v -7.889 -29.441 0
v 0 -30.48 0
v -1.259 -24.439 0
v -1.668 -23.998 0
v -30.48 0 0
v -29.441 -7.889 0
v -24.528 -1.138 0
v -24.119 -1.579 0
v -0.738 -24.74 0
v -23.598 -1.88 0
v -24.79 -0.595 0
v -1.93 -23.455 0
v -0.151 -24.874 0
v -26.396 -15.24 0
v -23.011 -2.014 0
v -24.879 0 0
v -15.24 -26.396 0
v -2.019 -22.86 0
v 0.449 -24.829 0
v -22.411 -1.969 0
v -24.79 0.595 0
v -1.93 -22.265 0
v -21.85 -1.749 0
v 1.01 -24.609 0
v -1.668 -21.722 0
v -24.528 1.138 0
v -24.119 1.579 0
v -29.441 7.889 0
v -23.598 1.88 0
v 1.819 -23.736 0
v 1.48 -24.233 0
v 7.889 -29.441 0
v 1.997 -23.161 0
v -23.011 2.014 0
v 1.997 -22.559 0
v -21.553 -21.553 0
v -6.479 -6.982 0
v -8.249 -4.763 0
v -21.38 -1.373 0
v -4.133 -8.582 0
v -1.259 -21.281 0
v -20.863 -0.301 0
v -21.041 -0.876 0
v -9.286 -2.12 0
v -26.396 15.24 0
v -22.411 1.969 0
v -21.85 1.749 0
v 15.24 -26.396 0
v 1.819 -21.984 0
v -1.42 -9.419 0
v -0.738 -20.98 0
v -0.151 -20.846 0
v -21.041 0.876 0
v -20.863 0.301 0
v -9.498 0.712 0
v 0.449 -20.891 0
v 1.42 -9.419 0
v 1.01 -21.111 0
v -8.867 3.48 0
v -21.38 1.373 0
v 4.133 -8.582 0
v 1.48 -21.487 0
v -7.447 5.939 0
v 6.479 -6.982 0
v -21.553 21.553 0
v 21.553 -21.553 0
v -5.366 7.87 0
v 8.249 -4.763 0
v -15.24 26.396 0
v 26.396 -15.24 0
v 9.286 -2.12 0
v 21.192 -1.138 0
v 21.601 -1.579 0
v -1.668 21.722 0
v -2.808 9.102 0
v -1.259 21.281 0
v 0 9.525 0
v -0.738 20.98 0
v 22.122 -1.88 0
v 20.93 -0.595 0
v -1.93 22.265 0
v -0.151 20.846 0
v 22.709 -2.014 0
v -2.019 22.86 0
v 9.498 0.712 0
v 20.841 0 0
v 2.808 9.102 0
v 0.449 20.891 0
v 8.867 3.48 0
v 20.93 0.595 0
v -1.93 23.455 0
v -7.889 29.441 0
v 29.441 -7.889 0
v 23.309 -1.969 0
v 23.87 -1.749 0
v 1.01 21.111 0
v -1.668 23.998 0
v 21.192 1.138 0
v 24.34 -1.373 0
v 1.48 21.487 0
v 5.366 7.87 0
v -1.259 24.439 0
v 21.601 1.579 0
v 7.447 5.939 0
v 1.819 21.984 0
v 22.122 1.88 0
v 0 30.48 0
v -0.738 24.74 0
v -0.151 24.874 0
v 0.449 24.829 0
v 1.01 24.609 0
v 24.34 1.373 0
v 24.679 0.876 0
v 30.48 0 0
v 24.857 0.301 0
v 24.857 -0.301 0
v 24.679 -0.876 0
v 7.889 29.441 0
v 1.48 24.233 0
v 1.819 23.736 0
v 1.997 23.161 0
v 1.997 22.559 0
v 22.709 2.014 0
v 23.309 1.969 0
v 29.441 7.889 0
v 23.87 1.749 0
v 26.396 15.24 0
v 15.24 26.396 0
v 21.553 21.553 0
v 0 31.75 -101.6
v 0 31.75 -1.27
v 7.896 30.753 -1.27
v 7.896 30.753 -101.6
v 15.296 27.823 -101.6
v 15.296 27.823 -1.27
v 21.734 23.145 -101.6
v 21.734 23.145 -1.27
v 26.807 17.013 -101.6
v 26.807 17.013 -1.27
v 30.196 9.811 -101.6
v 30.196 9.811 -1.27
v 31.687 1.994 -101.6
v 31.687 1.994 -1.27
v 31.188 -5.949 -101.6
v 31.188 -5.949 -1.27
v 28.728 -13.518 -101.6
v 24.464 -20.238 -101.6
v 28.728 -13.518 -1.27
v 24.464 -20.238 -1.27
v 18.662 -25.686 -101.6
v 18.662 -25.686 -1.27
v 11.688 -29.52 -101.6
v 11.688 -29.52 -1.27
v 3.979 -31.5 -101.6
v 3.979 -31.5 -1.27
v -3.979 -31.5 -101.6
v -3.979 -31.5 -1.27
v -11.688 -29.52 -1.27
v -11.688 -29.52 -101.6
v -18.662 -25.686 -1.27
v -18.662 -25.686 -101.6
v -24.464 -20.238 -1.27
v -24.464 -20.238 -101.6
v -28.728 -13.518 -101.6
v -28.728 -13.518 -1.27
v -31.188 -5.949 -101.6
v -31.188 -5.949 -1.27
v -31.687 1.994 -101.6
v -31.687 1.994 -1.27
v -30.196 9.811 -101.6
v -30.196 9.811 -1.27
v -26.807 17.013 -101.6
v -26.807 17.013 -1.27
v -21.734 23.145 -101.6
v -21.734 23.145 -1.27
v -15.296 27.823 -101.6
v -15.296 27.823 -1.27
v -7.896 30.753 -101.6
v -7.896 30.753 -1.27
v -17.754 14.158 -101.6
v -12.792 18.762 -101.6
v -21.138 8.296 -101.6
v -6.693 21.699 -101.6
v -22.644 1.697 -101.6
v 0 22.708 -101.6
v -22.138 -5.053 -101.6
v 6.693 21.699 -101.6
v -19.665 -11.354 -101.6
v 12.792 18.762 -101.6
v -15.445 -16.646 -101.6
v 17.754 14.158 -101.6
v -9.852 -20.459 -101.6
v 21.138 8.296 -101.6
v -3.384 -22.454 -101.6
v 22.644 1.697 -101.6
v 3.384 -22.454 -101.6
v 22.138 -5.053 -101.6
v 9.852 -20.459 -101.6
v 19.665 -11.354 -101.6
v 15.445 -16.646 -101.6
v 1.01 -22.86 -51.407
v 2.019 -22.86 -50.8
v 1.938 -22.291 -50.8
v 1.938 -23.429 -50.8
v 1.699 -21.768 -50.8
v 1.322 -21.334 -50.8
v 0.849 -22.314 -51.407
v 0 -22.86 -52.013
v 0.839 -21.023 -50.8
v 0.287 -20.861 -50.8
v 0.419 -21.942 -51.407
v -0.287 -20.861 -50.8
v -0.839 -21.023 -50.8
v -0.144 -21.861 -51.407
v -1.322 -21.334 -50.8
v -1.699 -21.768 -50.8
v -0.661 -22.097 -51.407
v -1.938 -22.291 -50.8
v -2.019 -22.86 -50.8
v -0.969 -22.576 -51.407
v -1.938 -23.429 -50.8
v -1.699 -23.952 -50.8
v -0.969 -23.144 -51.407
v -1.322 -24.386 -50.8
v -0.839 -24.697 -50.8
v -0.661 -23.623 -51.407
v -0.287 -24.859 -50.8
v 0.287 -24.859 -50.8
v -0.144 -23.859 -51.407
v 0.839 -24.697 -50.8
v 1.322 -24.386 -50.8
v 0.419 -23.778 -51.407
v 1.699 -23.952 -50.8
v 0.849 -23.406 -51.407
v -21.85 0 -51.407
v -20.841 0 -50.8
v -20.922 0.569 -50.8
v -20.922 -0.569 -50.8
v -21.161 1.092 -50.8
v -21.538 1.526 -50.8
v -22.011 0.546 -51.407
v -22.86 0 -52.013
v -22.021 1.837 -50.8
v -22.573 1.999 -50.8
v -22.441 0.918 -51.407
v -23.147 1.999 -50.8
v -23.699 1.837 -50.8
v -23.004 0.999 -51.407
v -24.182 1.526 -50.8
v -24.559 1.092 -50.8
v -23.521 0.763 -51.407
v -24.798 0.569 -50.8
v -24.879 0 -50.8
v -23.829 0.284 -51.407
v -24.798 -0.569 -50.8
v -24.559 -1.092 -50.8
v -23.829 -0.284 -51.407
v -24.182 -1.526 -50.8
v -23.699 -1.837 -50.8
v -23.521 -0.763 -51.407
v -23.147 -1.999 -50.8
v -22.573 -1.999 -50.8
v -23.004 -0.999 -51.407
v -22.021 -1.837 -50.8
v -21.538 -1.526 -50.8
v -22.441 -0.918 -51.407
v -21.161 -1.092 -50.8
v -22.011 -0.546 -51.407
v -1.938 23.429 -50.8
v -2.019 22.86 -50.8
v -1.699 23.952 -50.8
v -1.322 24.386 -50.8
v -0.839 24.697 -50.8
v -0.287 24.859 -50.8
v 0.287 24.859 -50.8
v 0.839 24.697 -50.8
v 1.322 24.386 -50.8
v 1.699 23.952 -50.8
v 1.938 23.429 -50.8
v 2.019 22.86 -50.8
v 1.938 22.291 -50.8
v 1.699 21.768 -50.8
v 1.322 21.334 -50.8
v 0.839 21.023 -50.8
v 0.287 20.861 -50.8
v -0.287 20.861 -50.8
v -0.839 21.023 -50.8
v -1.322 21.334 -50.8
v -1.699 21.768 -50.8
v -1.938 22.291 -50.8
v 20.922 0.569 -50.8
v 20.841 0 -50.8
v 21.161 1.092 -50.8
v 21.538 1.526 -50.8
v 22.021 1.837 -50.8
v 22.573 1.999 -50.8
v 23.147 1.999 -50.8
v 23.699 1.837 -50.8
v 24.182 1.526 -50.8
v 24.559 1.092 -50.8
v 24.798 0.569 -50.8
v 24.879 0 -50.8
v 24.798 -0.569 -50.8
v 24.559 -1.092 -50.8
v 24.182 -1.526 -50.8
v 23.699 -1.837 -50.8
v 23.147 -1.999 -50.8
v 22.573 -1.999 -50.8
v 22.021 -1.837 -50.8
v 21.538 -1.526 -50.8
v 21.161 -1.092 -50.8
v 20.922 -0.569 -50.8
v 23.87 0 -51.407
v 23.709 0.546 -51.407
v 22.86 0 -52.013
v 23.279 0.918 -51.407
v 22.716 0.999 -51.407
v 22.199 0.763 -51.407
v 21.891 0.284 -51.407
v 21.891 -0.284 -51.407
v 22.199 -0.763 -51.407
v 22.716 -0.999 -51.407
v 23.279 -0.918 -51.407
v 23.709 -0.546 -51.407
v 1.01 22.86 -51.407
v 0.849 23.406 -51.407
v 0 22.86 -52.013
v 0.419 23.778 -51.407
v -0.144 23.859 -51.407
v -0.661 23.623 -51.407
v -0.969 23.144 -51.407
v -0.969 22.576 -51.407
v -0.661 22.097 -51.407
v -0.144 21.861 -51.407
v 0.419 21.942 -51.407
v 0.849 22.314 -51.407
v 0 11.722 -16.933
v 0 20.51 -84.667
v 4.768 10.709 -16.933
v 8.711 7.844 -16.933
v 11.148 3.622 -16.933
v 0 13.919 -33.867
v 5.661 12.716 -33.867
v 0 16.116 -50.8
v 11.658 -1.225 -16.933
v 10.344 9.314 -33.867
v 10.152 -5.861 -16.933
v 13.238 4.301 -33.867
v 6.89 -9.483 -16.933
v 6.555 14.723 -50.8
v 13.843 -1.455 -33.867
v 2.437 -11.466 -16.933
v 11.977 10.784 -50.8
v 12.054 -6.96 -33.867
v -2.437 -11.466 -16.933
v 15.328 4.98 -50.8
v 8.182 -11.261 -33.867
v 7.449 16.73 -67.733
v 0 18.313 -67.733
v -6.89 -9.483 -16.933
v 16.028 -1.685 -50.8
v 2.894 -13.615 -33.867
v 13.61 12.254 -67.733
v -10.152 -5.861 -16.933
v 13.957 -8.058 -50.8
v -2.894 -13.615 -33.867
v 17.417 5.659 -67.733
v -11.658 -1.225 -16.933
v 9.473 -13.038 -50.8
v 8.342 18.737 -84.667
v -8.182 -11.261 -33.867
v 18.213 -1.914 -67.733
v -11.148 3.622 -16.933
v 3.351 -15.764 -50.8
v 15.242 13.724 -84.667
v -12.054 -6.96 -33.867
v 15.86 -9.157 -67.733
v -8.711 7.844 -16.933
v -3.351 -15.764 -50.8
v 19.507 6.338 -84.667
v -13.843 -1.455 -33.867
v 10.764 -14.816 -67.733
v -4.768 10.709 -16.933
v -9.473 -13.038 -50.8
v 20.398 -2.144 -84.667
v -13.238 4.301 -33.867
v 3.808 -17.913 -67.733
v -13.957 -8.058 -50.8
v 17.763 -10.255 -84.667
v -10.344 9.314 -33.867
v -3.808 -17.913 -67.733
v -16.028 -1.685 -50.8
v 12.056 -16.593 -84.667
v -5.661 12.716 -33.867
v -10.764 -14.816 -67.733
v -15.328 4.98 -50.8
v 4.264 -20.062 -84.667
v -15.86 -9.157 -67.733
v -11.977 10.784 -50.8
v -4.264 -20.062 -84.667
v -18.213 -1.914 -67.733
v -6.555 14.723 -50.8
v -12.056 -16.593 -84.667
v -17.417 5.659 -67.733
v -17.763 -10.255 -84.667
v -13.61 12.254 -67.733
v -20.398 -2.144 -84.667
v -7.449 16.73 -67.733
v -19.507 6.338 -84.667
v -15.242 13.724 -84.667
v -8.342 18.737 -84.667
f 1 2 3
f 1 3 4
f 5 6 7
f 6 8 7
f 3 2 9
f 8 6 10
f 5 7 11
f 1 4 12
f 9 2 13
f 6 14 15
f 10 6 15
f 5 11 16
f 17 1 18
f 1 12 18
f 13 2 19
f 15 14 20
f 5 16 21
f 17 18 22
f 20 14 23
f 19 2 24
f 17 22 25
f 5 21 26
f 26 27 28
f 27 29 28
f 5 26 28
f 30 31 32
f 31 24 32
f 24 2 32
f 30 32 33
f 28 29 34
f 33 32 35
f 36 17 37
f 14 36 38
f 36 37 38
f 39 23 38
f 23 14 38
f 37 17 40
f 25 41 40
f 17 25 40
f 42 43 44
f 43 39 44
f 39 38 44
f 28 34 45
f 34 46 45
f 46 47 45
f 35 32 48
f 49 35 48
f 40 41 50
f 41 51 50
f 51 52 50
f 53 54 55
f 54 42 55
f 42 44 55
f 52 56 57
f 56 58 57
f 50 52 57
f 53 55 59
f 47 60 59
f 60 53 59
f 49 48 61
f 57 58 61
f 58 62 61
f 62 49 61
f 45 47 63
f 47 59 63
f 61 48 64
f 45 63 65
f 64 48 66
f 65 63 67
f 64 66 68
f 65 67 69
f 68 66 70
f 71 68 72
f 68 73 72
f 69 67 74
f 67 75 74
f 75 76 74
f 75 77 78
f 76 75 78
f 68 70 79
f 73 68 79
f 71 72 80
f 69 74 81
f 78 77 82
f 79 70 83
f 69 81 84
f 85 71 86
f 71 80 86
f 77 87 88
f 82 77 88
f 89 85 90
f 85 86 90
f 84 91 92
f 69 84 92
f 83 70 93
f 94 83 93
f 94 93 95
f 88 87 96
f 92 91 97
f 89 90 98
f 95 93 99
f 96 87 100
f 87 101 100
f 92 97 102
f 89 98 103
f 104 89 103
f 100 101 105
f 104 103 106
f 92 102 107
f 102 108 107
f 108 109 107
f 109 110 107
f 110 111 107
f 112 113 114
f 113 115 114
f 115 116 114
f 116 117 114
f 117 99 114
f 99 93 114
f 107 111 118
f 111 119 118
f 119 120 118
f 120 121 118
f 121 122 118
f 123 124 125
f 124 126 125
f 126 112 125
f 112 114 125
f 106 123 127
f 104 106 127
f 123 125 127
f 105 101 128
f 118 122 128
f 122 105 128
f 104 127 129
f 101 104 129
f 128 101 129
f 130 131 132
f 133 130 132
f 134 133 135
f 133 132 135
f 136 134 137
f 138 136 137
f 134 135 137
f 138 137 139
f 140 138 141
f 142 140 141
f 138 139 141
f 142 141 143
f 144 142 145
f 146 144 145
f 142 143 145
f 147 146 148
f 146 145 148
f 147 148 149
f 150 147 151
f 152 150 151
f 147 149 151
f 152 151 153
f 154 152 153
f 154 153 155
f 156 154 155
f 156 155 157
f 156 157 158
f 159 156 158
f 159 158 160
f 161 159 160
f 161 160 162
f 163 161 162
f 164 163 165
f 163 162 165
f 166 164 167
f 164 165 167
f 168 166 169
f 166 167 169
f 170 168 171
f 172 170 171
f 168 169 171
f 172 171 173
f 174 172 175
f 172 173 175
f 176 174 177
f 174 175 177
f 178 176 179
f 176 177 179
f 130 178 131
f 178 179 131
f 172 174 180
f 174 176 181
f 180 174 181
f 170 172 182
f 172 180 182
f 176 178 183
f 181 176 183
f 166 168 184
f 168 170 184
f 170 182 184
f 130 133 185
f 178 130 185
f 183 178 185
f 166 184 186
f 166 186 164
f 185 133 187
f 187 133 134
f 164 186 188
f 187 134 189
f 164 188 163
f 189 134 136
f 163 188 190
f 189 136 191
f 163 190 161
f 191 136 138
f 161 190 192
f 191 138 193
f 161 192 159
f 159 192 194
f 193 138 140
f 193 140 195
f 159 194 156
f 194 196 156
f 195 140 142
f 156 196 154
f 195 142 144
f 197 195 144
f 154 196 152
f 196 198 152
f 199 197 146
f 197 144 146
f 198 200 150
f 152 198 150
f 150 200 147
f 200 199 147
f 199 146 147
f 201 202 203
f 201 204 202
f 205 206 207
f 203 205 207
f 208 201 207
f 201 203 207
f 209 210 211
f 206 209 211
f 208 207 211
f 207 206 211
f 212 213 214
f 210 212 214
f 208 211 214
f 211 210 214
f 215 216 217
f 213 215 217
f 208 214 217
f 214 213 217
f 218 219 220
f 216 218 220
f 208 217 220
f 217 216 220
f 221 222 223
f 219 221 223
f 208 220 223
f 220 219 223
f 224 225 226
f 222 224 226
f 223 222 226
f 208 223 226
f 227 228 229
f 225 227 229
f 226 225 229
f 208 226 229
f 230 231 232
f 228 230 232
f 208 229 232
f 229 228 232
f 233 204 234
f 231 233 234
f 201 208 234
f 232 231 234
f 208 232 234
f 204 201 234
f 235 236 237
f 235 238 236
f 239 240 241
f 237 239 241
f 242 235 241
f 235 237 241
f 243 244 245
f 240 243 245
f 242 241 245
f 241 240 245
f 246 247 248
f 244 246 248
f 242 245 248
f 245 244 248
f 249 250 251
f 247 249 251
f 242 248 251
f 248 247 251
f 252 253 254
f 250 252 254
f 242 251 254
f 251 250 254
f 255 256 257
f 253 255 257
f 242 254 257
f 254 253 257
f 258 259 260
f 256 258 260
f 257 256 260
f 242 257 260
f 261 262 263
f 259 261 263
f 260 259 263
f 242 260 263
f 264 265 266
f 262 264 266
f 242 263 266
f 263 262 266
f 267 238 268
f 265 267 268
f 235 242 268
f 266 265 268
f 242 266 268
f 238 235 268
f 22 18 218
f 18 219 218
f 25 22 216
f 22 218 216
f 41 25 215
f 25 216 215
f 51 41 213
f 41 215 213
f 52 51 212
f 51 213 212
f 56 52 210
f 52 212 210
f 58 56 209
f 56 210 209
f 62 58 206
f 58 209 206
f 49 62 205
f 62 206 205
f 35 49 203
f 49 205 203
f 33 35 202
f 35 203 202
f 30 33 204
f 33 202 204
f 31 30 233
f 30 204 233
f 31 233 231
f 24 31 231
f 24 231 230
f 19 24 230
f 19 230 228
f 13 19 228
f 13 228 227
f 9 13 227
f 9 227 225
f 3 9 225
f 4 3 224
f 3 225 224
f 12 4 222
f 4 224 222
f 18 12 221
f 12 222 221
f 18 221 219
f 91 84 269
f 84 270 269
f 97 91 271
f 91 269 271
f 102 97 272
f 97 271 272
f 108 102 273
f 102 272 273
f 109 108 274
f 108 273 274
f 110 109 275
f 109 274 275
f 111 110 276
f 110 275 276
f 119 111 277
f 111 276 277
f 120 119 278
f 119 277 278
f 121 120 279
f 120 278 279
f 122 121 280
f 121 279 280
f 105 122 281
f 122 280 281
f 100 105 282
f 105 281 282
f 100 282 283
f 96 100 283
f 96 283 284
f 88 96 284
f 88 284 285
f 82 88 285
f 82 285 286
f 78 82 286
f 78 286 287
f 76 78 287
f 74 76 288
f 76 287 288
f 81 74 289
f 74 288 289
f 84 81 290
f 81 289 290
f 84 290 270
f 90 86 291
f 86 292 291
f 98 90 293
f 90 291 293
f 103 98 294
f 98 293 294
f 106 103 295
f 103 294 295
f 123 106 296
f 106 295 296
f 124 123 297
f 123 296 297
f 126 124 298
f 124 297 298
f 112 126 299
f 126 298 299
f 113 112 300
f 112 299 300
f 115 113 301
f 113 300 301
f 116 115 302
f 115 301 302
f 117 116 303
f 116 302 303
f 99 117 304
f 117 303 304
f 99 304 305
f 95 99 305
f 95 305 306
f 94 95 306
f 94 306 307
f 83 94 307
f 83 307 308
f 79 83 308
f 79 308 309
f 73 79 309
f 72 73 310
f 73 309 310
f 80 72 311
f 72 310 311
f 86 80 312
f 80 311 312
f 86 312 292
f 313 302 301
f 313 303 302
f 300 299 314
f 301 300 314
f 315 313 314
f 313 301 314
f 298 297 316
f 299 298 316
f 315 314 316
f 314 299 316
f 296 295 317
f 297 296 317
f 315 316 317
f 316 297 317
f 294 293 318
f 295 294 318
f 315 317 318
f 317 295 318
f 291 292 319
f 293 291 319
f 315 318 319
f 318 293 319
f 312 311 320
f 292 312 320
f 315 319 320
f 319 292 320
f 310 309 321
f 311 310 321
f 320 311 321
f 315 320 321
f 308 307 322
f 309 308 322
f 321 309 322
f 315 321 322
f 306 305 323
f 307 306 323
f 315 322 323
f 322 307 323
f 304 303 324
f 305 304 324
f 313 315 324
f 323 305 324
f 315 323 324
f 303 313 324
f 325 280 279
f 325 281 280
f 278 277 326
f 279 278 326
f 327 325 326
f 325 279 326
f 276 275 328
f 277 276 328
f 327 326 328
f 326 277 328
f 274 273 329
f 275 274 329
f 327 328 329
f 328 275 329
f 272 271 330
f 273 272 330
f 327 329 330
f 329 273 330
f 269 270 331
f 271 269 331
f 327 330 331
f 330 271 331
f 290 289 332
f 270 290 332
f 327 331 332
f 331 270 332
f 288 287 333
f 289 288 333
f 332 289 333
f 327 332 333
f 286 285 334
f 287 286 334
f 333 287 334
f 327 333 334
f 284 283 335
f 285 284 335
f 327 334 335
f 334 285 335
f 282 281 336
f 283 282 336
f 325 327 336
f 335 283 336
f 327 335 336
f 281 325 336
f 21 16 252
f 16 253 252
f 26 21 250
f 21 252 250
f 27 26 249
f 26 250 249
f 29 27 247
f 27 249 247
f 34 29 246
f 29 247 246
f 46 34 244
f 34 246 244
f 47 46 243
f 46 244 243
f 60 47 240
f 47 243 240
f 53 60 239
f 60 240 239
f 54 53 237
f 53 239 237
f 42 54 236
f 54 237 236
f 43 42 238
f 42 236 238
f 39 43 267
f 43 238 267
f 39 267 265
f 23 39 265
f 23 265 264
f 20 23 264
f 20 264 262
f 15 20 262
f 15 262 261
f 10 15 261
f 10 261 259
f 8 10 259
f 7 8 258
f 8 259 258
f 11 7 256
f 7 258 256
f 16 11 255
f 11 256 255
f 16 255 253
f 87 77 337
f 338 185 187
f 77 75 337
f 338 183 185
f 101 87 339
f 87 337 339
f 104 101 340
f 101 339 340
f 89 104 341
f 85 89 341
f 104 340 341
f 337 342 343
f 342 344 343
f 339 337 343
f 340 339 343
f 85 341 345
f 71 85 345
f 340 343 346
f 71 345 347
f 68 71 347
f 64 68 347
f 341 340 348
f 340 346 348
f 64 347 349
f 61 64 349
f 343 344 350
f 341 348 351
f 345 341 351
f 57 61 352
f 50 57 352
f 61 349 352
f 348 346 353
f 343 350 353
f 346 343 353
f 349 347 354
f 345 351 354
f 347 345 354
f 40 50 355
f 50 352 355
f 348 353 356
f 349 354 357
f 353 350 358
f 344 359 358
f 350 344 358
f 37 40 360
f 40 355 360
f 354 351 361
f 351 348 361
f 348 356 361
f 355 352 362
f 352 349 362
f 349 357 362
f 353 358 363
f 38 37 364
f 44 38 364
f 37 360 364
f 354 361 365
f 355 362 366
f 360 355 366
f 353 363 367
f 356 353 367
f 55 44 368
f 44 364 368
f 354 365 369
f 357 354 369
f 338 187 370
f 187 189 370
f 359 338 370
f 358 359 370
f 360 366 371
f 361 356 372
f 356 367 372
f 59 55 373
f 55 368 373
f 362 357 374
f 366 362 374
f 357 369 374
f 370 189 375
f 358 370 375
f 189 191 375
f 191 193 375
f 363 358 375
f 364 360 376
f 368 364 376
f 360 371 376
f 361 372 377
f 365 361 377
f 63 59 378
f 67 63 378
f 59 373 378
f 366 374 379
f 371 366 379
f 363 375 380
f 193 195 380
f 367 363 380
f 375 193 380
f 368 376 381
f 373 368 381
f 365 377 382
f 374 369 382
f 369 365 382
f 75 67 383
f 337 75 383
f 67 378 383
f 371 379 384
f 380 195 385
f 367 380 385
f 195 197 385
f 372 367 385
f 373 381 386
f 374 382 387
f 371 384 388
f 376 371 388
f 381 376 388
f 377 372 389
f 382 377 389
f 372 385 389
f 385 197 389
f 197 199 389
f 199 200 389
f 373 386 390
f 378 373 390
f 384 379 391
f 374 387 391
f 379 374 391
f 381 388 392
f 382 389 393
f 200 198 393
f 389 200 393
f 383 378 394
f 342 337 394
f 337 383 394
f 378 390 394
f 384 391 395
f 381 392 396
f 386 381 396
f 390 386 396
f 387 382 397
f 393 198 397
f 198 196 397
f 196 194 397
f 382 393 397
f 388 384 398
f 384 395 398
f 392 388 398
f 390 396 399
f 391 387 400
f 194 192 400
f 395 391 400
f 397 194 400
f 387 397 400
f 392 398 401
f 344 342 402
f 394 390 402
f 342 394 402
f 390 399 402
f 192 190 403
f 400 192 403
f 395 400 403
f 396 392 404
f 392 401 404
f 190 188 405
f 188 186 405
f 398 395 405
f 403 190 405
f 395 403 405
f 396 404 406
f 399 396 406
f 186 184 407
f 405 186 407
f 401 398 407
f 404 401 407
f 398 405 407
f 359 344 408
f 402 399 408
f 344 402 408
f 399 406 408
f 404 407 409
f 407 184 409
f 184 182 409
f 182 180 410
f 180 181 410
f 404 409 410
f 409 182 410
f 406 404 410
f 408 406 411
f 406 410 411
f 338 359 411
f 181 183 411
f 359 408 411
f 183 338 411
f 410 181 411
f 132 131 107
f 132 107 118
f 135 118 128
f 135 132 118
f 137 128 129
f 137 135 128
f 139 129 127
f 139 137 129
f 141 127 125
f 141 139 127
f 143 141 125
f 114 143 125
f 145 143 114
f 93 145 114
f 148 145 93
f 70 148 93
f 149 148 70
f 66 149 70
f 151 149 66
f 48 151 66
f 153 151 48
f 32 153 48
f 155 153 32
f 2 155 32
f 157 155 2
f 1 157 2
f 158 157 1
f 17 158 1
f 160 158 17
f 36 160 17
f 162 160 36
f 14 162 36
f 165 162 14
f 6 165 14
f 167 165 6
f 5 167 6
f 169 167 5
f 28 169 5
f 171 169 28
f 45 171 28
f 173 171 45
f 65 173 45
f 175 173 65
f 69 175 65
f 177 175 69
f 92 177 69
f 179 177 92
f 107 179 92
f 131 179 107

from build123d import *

# Parameters (mm, degrees)
F_10_32_TAPPED_HOLE1_D     = 4.0386
F_10_32_TAPPED_HOLE1_DEPTH = 50.8
F_10_32_TAPPED_HOLE1_TIP   = 1.213317848
CHAMFER1_SIZE              = 1.27


with BuildPart() as part:
    # Sketch1 → Revolve1 (revolve)
    with BuildSketch(Plane(origin=(0, 0, 0), x_dir=(0, 0, -1), z_dir=(1, 0, 0))):
        Polygon((0, 9.525), (101.6, 22.7076), (101.6, 31.75), (0, 31.75), align=None)
    revolve(axis=Axis((0, 0, 60.933225134), (0, 0, -1)))

    # #10-32 Tapped Hole1
    with Locations(Plane.XY):
        with Locations((0, 22.86), (22.86, 0), (0, -22.86), (-22.86, 0), (0, 0)):
            Hole(F_10_32_TAPPED_HOLE1_D / 2, depth=F_10_32_TAPPED_HOLE1_DEPTH)
            with Locations((0, 0, -(F_10_32_TAPPED_HOLE1_DEPTH + F_10_32_TAPPED_HOLE1_TIP / 2))):  # 118° drill point
                Cone(0, F_10_32_TAPPED_HOLE1_D / 2, F_10_32_TAPPED_HOLE1_TIP, mode=Mode.SUBTRACT)

    # Chamfer1
    chamfer1_edges = [part.edges().sort_by_distance(p)[0] for p in [
        (0, -31.75, 0),
    ]]
    chamfer(chamfer1_edges, length=CHAMFER1_SIZE)


solid = part.part
